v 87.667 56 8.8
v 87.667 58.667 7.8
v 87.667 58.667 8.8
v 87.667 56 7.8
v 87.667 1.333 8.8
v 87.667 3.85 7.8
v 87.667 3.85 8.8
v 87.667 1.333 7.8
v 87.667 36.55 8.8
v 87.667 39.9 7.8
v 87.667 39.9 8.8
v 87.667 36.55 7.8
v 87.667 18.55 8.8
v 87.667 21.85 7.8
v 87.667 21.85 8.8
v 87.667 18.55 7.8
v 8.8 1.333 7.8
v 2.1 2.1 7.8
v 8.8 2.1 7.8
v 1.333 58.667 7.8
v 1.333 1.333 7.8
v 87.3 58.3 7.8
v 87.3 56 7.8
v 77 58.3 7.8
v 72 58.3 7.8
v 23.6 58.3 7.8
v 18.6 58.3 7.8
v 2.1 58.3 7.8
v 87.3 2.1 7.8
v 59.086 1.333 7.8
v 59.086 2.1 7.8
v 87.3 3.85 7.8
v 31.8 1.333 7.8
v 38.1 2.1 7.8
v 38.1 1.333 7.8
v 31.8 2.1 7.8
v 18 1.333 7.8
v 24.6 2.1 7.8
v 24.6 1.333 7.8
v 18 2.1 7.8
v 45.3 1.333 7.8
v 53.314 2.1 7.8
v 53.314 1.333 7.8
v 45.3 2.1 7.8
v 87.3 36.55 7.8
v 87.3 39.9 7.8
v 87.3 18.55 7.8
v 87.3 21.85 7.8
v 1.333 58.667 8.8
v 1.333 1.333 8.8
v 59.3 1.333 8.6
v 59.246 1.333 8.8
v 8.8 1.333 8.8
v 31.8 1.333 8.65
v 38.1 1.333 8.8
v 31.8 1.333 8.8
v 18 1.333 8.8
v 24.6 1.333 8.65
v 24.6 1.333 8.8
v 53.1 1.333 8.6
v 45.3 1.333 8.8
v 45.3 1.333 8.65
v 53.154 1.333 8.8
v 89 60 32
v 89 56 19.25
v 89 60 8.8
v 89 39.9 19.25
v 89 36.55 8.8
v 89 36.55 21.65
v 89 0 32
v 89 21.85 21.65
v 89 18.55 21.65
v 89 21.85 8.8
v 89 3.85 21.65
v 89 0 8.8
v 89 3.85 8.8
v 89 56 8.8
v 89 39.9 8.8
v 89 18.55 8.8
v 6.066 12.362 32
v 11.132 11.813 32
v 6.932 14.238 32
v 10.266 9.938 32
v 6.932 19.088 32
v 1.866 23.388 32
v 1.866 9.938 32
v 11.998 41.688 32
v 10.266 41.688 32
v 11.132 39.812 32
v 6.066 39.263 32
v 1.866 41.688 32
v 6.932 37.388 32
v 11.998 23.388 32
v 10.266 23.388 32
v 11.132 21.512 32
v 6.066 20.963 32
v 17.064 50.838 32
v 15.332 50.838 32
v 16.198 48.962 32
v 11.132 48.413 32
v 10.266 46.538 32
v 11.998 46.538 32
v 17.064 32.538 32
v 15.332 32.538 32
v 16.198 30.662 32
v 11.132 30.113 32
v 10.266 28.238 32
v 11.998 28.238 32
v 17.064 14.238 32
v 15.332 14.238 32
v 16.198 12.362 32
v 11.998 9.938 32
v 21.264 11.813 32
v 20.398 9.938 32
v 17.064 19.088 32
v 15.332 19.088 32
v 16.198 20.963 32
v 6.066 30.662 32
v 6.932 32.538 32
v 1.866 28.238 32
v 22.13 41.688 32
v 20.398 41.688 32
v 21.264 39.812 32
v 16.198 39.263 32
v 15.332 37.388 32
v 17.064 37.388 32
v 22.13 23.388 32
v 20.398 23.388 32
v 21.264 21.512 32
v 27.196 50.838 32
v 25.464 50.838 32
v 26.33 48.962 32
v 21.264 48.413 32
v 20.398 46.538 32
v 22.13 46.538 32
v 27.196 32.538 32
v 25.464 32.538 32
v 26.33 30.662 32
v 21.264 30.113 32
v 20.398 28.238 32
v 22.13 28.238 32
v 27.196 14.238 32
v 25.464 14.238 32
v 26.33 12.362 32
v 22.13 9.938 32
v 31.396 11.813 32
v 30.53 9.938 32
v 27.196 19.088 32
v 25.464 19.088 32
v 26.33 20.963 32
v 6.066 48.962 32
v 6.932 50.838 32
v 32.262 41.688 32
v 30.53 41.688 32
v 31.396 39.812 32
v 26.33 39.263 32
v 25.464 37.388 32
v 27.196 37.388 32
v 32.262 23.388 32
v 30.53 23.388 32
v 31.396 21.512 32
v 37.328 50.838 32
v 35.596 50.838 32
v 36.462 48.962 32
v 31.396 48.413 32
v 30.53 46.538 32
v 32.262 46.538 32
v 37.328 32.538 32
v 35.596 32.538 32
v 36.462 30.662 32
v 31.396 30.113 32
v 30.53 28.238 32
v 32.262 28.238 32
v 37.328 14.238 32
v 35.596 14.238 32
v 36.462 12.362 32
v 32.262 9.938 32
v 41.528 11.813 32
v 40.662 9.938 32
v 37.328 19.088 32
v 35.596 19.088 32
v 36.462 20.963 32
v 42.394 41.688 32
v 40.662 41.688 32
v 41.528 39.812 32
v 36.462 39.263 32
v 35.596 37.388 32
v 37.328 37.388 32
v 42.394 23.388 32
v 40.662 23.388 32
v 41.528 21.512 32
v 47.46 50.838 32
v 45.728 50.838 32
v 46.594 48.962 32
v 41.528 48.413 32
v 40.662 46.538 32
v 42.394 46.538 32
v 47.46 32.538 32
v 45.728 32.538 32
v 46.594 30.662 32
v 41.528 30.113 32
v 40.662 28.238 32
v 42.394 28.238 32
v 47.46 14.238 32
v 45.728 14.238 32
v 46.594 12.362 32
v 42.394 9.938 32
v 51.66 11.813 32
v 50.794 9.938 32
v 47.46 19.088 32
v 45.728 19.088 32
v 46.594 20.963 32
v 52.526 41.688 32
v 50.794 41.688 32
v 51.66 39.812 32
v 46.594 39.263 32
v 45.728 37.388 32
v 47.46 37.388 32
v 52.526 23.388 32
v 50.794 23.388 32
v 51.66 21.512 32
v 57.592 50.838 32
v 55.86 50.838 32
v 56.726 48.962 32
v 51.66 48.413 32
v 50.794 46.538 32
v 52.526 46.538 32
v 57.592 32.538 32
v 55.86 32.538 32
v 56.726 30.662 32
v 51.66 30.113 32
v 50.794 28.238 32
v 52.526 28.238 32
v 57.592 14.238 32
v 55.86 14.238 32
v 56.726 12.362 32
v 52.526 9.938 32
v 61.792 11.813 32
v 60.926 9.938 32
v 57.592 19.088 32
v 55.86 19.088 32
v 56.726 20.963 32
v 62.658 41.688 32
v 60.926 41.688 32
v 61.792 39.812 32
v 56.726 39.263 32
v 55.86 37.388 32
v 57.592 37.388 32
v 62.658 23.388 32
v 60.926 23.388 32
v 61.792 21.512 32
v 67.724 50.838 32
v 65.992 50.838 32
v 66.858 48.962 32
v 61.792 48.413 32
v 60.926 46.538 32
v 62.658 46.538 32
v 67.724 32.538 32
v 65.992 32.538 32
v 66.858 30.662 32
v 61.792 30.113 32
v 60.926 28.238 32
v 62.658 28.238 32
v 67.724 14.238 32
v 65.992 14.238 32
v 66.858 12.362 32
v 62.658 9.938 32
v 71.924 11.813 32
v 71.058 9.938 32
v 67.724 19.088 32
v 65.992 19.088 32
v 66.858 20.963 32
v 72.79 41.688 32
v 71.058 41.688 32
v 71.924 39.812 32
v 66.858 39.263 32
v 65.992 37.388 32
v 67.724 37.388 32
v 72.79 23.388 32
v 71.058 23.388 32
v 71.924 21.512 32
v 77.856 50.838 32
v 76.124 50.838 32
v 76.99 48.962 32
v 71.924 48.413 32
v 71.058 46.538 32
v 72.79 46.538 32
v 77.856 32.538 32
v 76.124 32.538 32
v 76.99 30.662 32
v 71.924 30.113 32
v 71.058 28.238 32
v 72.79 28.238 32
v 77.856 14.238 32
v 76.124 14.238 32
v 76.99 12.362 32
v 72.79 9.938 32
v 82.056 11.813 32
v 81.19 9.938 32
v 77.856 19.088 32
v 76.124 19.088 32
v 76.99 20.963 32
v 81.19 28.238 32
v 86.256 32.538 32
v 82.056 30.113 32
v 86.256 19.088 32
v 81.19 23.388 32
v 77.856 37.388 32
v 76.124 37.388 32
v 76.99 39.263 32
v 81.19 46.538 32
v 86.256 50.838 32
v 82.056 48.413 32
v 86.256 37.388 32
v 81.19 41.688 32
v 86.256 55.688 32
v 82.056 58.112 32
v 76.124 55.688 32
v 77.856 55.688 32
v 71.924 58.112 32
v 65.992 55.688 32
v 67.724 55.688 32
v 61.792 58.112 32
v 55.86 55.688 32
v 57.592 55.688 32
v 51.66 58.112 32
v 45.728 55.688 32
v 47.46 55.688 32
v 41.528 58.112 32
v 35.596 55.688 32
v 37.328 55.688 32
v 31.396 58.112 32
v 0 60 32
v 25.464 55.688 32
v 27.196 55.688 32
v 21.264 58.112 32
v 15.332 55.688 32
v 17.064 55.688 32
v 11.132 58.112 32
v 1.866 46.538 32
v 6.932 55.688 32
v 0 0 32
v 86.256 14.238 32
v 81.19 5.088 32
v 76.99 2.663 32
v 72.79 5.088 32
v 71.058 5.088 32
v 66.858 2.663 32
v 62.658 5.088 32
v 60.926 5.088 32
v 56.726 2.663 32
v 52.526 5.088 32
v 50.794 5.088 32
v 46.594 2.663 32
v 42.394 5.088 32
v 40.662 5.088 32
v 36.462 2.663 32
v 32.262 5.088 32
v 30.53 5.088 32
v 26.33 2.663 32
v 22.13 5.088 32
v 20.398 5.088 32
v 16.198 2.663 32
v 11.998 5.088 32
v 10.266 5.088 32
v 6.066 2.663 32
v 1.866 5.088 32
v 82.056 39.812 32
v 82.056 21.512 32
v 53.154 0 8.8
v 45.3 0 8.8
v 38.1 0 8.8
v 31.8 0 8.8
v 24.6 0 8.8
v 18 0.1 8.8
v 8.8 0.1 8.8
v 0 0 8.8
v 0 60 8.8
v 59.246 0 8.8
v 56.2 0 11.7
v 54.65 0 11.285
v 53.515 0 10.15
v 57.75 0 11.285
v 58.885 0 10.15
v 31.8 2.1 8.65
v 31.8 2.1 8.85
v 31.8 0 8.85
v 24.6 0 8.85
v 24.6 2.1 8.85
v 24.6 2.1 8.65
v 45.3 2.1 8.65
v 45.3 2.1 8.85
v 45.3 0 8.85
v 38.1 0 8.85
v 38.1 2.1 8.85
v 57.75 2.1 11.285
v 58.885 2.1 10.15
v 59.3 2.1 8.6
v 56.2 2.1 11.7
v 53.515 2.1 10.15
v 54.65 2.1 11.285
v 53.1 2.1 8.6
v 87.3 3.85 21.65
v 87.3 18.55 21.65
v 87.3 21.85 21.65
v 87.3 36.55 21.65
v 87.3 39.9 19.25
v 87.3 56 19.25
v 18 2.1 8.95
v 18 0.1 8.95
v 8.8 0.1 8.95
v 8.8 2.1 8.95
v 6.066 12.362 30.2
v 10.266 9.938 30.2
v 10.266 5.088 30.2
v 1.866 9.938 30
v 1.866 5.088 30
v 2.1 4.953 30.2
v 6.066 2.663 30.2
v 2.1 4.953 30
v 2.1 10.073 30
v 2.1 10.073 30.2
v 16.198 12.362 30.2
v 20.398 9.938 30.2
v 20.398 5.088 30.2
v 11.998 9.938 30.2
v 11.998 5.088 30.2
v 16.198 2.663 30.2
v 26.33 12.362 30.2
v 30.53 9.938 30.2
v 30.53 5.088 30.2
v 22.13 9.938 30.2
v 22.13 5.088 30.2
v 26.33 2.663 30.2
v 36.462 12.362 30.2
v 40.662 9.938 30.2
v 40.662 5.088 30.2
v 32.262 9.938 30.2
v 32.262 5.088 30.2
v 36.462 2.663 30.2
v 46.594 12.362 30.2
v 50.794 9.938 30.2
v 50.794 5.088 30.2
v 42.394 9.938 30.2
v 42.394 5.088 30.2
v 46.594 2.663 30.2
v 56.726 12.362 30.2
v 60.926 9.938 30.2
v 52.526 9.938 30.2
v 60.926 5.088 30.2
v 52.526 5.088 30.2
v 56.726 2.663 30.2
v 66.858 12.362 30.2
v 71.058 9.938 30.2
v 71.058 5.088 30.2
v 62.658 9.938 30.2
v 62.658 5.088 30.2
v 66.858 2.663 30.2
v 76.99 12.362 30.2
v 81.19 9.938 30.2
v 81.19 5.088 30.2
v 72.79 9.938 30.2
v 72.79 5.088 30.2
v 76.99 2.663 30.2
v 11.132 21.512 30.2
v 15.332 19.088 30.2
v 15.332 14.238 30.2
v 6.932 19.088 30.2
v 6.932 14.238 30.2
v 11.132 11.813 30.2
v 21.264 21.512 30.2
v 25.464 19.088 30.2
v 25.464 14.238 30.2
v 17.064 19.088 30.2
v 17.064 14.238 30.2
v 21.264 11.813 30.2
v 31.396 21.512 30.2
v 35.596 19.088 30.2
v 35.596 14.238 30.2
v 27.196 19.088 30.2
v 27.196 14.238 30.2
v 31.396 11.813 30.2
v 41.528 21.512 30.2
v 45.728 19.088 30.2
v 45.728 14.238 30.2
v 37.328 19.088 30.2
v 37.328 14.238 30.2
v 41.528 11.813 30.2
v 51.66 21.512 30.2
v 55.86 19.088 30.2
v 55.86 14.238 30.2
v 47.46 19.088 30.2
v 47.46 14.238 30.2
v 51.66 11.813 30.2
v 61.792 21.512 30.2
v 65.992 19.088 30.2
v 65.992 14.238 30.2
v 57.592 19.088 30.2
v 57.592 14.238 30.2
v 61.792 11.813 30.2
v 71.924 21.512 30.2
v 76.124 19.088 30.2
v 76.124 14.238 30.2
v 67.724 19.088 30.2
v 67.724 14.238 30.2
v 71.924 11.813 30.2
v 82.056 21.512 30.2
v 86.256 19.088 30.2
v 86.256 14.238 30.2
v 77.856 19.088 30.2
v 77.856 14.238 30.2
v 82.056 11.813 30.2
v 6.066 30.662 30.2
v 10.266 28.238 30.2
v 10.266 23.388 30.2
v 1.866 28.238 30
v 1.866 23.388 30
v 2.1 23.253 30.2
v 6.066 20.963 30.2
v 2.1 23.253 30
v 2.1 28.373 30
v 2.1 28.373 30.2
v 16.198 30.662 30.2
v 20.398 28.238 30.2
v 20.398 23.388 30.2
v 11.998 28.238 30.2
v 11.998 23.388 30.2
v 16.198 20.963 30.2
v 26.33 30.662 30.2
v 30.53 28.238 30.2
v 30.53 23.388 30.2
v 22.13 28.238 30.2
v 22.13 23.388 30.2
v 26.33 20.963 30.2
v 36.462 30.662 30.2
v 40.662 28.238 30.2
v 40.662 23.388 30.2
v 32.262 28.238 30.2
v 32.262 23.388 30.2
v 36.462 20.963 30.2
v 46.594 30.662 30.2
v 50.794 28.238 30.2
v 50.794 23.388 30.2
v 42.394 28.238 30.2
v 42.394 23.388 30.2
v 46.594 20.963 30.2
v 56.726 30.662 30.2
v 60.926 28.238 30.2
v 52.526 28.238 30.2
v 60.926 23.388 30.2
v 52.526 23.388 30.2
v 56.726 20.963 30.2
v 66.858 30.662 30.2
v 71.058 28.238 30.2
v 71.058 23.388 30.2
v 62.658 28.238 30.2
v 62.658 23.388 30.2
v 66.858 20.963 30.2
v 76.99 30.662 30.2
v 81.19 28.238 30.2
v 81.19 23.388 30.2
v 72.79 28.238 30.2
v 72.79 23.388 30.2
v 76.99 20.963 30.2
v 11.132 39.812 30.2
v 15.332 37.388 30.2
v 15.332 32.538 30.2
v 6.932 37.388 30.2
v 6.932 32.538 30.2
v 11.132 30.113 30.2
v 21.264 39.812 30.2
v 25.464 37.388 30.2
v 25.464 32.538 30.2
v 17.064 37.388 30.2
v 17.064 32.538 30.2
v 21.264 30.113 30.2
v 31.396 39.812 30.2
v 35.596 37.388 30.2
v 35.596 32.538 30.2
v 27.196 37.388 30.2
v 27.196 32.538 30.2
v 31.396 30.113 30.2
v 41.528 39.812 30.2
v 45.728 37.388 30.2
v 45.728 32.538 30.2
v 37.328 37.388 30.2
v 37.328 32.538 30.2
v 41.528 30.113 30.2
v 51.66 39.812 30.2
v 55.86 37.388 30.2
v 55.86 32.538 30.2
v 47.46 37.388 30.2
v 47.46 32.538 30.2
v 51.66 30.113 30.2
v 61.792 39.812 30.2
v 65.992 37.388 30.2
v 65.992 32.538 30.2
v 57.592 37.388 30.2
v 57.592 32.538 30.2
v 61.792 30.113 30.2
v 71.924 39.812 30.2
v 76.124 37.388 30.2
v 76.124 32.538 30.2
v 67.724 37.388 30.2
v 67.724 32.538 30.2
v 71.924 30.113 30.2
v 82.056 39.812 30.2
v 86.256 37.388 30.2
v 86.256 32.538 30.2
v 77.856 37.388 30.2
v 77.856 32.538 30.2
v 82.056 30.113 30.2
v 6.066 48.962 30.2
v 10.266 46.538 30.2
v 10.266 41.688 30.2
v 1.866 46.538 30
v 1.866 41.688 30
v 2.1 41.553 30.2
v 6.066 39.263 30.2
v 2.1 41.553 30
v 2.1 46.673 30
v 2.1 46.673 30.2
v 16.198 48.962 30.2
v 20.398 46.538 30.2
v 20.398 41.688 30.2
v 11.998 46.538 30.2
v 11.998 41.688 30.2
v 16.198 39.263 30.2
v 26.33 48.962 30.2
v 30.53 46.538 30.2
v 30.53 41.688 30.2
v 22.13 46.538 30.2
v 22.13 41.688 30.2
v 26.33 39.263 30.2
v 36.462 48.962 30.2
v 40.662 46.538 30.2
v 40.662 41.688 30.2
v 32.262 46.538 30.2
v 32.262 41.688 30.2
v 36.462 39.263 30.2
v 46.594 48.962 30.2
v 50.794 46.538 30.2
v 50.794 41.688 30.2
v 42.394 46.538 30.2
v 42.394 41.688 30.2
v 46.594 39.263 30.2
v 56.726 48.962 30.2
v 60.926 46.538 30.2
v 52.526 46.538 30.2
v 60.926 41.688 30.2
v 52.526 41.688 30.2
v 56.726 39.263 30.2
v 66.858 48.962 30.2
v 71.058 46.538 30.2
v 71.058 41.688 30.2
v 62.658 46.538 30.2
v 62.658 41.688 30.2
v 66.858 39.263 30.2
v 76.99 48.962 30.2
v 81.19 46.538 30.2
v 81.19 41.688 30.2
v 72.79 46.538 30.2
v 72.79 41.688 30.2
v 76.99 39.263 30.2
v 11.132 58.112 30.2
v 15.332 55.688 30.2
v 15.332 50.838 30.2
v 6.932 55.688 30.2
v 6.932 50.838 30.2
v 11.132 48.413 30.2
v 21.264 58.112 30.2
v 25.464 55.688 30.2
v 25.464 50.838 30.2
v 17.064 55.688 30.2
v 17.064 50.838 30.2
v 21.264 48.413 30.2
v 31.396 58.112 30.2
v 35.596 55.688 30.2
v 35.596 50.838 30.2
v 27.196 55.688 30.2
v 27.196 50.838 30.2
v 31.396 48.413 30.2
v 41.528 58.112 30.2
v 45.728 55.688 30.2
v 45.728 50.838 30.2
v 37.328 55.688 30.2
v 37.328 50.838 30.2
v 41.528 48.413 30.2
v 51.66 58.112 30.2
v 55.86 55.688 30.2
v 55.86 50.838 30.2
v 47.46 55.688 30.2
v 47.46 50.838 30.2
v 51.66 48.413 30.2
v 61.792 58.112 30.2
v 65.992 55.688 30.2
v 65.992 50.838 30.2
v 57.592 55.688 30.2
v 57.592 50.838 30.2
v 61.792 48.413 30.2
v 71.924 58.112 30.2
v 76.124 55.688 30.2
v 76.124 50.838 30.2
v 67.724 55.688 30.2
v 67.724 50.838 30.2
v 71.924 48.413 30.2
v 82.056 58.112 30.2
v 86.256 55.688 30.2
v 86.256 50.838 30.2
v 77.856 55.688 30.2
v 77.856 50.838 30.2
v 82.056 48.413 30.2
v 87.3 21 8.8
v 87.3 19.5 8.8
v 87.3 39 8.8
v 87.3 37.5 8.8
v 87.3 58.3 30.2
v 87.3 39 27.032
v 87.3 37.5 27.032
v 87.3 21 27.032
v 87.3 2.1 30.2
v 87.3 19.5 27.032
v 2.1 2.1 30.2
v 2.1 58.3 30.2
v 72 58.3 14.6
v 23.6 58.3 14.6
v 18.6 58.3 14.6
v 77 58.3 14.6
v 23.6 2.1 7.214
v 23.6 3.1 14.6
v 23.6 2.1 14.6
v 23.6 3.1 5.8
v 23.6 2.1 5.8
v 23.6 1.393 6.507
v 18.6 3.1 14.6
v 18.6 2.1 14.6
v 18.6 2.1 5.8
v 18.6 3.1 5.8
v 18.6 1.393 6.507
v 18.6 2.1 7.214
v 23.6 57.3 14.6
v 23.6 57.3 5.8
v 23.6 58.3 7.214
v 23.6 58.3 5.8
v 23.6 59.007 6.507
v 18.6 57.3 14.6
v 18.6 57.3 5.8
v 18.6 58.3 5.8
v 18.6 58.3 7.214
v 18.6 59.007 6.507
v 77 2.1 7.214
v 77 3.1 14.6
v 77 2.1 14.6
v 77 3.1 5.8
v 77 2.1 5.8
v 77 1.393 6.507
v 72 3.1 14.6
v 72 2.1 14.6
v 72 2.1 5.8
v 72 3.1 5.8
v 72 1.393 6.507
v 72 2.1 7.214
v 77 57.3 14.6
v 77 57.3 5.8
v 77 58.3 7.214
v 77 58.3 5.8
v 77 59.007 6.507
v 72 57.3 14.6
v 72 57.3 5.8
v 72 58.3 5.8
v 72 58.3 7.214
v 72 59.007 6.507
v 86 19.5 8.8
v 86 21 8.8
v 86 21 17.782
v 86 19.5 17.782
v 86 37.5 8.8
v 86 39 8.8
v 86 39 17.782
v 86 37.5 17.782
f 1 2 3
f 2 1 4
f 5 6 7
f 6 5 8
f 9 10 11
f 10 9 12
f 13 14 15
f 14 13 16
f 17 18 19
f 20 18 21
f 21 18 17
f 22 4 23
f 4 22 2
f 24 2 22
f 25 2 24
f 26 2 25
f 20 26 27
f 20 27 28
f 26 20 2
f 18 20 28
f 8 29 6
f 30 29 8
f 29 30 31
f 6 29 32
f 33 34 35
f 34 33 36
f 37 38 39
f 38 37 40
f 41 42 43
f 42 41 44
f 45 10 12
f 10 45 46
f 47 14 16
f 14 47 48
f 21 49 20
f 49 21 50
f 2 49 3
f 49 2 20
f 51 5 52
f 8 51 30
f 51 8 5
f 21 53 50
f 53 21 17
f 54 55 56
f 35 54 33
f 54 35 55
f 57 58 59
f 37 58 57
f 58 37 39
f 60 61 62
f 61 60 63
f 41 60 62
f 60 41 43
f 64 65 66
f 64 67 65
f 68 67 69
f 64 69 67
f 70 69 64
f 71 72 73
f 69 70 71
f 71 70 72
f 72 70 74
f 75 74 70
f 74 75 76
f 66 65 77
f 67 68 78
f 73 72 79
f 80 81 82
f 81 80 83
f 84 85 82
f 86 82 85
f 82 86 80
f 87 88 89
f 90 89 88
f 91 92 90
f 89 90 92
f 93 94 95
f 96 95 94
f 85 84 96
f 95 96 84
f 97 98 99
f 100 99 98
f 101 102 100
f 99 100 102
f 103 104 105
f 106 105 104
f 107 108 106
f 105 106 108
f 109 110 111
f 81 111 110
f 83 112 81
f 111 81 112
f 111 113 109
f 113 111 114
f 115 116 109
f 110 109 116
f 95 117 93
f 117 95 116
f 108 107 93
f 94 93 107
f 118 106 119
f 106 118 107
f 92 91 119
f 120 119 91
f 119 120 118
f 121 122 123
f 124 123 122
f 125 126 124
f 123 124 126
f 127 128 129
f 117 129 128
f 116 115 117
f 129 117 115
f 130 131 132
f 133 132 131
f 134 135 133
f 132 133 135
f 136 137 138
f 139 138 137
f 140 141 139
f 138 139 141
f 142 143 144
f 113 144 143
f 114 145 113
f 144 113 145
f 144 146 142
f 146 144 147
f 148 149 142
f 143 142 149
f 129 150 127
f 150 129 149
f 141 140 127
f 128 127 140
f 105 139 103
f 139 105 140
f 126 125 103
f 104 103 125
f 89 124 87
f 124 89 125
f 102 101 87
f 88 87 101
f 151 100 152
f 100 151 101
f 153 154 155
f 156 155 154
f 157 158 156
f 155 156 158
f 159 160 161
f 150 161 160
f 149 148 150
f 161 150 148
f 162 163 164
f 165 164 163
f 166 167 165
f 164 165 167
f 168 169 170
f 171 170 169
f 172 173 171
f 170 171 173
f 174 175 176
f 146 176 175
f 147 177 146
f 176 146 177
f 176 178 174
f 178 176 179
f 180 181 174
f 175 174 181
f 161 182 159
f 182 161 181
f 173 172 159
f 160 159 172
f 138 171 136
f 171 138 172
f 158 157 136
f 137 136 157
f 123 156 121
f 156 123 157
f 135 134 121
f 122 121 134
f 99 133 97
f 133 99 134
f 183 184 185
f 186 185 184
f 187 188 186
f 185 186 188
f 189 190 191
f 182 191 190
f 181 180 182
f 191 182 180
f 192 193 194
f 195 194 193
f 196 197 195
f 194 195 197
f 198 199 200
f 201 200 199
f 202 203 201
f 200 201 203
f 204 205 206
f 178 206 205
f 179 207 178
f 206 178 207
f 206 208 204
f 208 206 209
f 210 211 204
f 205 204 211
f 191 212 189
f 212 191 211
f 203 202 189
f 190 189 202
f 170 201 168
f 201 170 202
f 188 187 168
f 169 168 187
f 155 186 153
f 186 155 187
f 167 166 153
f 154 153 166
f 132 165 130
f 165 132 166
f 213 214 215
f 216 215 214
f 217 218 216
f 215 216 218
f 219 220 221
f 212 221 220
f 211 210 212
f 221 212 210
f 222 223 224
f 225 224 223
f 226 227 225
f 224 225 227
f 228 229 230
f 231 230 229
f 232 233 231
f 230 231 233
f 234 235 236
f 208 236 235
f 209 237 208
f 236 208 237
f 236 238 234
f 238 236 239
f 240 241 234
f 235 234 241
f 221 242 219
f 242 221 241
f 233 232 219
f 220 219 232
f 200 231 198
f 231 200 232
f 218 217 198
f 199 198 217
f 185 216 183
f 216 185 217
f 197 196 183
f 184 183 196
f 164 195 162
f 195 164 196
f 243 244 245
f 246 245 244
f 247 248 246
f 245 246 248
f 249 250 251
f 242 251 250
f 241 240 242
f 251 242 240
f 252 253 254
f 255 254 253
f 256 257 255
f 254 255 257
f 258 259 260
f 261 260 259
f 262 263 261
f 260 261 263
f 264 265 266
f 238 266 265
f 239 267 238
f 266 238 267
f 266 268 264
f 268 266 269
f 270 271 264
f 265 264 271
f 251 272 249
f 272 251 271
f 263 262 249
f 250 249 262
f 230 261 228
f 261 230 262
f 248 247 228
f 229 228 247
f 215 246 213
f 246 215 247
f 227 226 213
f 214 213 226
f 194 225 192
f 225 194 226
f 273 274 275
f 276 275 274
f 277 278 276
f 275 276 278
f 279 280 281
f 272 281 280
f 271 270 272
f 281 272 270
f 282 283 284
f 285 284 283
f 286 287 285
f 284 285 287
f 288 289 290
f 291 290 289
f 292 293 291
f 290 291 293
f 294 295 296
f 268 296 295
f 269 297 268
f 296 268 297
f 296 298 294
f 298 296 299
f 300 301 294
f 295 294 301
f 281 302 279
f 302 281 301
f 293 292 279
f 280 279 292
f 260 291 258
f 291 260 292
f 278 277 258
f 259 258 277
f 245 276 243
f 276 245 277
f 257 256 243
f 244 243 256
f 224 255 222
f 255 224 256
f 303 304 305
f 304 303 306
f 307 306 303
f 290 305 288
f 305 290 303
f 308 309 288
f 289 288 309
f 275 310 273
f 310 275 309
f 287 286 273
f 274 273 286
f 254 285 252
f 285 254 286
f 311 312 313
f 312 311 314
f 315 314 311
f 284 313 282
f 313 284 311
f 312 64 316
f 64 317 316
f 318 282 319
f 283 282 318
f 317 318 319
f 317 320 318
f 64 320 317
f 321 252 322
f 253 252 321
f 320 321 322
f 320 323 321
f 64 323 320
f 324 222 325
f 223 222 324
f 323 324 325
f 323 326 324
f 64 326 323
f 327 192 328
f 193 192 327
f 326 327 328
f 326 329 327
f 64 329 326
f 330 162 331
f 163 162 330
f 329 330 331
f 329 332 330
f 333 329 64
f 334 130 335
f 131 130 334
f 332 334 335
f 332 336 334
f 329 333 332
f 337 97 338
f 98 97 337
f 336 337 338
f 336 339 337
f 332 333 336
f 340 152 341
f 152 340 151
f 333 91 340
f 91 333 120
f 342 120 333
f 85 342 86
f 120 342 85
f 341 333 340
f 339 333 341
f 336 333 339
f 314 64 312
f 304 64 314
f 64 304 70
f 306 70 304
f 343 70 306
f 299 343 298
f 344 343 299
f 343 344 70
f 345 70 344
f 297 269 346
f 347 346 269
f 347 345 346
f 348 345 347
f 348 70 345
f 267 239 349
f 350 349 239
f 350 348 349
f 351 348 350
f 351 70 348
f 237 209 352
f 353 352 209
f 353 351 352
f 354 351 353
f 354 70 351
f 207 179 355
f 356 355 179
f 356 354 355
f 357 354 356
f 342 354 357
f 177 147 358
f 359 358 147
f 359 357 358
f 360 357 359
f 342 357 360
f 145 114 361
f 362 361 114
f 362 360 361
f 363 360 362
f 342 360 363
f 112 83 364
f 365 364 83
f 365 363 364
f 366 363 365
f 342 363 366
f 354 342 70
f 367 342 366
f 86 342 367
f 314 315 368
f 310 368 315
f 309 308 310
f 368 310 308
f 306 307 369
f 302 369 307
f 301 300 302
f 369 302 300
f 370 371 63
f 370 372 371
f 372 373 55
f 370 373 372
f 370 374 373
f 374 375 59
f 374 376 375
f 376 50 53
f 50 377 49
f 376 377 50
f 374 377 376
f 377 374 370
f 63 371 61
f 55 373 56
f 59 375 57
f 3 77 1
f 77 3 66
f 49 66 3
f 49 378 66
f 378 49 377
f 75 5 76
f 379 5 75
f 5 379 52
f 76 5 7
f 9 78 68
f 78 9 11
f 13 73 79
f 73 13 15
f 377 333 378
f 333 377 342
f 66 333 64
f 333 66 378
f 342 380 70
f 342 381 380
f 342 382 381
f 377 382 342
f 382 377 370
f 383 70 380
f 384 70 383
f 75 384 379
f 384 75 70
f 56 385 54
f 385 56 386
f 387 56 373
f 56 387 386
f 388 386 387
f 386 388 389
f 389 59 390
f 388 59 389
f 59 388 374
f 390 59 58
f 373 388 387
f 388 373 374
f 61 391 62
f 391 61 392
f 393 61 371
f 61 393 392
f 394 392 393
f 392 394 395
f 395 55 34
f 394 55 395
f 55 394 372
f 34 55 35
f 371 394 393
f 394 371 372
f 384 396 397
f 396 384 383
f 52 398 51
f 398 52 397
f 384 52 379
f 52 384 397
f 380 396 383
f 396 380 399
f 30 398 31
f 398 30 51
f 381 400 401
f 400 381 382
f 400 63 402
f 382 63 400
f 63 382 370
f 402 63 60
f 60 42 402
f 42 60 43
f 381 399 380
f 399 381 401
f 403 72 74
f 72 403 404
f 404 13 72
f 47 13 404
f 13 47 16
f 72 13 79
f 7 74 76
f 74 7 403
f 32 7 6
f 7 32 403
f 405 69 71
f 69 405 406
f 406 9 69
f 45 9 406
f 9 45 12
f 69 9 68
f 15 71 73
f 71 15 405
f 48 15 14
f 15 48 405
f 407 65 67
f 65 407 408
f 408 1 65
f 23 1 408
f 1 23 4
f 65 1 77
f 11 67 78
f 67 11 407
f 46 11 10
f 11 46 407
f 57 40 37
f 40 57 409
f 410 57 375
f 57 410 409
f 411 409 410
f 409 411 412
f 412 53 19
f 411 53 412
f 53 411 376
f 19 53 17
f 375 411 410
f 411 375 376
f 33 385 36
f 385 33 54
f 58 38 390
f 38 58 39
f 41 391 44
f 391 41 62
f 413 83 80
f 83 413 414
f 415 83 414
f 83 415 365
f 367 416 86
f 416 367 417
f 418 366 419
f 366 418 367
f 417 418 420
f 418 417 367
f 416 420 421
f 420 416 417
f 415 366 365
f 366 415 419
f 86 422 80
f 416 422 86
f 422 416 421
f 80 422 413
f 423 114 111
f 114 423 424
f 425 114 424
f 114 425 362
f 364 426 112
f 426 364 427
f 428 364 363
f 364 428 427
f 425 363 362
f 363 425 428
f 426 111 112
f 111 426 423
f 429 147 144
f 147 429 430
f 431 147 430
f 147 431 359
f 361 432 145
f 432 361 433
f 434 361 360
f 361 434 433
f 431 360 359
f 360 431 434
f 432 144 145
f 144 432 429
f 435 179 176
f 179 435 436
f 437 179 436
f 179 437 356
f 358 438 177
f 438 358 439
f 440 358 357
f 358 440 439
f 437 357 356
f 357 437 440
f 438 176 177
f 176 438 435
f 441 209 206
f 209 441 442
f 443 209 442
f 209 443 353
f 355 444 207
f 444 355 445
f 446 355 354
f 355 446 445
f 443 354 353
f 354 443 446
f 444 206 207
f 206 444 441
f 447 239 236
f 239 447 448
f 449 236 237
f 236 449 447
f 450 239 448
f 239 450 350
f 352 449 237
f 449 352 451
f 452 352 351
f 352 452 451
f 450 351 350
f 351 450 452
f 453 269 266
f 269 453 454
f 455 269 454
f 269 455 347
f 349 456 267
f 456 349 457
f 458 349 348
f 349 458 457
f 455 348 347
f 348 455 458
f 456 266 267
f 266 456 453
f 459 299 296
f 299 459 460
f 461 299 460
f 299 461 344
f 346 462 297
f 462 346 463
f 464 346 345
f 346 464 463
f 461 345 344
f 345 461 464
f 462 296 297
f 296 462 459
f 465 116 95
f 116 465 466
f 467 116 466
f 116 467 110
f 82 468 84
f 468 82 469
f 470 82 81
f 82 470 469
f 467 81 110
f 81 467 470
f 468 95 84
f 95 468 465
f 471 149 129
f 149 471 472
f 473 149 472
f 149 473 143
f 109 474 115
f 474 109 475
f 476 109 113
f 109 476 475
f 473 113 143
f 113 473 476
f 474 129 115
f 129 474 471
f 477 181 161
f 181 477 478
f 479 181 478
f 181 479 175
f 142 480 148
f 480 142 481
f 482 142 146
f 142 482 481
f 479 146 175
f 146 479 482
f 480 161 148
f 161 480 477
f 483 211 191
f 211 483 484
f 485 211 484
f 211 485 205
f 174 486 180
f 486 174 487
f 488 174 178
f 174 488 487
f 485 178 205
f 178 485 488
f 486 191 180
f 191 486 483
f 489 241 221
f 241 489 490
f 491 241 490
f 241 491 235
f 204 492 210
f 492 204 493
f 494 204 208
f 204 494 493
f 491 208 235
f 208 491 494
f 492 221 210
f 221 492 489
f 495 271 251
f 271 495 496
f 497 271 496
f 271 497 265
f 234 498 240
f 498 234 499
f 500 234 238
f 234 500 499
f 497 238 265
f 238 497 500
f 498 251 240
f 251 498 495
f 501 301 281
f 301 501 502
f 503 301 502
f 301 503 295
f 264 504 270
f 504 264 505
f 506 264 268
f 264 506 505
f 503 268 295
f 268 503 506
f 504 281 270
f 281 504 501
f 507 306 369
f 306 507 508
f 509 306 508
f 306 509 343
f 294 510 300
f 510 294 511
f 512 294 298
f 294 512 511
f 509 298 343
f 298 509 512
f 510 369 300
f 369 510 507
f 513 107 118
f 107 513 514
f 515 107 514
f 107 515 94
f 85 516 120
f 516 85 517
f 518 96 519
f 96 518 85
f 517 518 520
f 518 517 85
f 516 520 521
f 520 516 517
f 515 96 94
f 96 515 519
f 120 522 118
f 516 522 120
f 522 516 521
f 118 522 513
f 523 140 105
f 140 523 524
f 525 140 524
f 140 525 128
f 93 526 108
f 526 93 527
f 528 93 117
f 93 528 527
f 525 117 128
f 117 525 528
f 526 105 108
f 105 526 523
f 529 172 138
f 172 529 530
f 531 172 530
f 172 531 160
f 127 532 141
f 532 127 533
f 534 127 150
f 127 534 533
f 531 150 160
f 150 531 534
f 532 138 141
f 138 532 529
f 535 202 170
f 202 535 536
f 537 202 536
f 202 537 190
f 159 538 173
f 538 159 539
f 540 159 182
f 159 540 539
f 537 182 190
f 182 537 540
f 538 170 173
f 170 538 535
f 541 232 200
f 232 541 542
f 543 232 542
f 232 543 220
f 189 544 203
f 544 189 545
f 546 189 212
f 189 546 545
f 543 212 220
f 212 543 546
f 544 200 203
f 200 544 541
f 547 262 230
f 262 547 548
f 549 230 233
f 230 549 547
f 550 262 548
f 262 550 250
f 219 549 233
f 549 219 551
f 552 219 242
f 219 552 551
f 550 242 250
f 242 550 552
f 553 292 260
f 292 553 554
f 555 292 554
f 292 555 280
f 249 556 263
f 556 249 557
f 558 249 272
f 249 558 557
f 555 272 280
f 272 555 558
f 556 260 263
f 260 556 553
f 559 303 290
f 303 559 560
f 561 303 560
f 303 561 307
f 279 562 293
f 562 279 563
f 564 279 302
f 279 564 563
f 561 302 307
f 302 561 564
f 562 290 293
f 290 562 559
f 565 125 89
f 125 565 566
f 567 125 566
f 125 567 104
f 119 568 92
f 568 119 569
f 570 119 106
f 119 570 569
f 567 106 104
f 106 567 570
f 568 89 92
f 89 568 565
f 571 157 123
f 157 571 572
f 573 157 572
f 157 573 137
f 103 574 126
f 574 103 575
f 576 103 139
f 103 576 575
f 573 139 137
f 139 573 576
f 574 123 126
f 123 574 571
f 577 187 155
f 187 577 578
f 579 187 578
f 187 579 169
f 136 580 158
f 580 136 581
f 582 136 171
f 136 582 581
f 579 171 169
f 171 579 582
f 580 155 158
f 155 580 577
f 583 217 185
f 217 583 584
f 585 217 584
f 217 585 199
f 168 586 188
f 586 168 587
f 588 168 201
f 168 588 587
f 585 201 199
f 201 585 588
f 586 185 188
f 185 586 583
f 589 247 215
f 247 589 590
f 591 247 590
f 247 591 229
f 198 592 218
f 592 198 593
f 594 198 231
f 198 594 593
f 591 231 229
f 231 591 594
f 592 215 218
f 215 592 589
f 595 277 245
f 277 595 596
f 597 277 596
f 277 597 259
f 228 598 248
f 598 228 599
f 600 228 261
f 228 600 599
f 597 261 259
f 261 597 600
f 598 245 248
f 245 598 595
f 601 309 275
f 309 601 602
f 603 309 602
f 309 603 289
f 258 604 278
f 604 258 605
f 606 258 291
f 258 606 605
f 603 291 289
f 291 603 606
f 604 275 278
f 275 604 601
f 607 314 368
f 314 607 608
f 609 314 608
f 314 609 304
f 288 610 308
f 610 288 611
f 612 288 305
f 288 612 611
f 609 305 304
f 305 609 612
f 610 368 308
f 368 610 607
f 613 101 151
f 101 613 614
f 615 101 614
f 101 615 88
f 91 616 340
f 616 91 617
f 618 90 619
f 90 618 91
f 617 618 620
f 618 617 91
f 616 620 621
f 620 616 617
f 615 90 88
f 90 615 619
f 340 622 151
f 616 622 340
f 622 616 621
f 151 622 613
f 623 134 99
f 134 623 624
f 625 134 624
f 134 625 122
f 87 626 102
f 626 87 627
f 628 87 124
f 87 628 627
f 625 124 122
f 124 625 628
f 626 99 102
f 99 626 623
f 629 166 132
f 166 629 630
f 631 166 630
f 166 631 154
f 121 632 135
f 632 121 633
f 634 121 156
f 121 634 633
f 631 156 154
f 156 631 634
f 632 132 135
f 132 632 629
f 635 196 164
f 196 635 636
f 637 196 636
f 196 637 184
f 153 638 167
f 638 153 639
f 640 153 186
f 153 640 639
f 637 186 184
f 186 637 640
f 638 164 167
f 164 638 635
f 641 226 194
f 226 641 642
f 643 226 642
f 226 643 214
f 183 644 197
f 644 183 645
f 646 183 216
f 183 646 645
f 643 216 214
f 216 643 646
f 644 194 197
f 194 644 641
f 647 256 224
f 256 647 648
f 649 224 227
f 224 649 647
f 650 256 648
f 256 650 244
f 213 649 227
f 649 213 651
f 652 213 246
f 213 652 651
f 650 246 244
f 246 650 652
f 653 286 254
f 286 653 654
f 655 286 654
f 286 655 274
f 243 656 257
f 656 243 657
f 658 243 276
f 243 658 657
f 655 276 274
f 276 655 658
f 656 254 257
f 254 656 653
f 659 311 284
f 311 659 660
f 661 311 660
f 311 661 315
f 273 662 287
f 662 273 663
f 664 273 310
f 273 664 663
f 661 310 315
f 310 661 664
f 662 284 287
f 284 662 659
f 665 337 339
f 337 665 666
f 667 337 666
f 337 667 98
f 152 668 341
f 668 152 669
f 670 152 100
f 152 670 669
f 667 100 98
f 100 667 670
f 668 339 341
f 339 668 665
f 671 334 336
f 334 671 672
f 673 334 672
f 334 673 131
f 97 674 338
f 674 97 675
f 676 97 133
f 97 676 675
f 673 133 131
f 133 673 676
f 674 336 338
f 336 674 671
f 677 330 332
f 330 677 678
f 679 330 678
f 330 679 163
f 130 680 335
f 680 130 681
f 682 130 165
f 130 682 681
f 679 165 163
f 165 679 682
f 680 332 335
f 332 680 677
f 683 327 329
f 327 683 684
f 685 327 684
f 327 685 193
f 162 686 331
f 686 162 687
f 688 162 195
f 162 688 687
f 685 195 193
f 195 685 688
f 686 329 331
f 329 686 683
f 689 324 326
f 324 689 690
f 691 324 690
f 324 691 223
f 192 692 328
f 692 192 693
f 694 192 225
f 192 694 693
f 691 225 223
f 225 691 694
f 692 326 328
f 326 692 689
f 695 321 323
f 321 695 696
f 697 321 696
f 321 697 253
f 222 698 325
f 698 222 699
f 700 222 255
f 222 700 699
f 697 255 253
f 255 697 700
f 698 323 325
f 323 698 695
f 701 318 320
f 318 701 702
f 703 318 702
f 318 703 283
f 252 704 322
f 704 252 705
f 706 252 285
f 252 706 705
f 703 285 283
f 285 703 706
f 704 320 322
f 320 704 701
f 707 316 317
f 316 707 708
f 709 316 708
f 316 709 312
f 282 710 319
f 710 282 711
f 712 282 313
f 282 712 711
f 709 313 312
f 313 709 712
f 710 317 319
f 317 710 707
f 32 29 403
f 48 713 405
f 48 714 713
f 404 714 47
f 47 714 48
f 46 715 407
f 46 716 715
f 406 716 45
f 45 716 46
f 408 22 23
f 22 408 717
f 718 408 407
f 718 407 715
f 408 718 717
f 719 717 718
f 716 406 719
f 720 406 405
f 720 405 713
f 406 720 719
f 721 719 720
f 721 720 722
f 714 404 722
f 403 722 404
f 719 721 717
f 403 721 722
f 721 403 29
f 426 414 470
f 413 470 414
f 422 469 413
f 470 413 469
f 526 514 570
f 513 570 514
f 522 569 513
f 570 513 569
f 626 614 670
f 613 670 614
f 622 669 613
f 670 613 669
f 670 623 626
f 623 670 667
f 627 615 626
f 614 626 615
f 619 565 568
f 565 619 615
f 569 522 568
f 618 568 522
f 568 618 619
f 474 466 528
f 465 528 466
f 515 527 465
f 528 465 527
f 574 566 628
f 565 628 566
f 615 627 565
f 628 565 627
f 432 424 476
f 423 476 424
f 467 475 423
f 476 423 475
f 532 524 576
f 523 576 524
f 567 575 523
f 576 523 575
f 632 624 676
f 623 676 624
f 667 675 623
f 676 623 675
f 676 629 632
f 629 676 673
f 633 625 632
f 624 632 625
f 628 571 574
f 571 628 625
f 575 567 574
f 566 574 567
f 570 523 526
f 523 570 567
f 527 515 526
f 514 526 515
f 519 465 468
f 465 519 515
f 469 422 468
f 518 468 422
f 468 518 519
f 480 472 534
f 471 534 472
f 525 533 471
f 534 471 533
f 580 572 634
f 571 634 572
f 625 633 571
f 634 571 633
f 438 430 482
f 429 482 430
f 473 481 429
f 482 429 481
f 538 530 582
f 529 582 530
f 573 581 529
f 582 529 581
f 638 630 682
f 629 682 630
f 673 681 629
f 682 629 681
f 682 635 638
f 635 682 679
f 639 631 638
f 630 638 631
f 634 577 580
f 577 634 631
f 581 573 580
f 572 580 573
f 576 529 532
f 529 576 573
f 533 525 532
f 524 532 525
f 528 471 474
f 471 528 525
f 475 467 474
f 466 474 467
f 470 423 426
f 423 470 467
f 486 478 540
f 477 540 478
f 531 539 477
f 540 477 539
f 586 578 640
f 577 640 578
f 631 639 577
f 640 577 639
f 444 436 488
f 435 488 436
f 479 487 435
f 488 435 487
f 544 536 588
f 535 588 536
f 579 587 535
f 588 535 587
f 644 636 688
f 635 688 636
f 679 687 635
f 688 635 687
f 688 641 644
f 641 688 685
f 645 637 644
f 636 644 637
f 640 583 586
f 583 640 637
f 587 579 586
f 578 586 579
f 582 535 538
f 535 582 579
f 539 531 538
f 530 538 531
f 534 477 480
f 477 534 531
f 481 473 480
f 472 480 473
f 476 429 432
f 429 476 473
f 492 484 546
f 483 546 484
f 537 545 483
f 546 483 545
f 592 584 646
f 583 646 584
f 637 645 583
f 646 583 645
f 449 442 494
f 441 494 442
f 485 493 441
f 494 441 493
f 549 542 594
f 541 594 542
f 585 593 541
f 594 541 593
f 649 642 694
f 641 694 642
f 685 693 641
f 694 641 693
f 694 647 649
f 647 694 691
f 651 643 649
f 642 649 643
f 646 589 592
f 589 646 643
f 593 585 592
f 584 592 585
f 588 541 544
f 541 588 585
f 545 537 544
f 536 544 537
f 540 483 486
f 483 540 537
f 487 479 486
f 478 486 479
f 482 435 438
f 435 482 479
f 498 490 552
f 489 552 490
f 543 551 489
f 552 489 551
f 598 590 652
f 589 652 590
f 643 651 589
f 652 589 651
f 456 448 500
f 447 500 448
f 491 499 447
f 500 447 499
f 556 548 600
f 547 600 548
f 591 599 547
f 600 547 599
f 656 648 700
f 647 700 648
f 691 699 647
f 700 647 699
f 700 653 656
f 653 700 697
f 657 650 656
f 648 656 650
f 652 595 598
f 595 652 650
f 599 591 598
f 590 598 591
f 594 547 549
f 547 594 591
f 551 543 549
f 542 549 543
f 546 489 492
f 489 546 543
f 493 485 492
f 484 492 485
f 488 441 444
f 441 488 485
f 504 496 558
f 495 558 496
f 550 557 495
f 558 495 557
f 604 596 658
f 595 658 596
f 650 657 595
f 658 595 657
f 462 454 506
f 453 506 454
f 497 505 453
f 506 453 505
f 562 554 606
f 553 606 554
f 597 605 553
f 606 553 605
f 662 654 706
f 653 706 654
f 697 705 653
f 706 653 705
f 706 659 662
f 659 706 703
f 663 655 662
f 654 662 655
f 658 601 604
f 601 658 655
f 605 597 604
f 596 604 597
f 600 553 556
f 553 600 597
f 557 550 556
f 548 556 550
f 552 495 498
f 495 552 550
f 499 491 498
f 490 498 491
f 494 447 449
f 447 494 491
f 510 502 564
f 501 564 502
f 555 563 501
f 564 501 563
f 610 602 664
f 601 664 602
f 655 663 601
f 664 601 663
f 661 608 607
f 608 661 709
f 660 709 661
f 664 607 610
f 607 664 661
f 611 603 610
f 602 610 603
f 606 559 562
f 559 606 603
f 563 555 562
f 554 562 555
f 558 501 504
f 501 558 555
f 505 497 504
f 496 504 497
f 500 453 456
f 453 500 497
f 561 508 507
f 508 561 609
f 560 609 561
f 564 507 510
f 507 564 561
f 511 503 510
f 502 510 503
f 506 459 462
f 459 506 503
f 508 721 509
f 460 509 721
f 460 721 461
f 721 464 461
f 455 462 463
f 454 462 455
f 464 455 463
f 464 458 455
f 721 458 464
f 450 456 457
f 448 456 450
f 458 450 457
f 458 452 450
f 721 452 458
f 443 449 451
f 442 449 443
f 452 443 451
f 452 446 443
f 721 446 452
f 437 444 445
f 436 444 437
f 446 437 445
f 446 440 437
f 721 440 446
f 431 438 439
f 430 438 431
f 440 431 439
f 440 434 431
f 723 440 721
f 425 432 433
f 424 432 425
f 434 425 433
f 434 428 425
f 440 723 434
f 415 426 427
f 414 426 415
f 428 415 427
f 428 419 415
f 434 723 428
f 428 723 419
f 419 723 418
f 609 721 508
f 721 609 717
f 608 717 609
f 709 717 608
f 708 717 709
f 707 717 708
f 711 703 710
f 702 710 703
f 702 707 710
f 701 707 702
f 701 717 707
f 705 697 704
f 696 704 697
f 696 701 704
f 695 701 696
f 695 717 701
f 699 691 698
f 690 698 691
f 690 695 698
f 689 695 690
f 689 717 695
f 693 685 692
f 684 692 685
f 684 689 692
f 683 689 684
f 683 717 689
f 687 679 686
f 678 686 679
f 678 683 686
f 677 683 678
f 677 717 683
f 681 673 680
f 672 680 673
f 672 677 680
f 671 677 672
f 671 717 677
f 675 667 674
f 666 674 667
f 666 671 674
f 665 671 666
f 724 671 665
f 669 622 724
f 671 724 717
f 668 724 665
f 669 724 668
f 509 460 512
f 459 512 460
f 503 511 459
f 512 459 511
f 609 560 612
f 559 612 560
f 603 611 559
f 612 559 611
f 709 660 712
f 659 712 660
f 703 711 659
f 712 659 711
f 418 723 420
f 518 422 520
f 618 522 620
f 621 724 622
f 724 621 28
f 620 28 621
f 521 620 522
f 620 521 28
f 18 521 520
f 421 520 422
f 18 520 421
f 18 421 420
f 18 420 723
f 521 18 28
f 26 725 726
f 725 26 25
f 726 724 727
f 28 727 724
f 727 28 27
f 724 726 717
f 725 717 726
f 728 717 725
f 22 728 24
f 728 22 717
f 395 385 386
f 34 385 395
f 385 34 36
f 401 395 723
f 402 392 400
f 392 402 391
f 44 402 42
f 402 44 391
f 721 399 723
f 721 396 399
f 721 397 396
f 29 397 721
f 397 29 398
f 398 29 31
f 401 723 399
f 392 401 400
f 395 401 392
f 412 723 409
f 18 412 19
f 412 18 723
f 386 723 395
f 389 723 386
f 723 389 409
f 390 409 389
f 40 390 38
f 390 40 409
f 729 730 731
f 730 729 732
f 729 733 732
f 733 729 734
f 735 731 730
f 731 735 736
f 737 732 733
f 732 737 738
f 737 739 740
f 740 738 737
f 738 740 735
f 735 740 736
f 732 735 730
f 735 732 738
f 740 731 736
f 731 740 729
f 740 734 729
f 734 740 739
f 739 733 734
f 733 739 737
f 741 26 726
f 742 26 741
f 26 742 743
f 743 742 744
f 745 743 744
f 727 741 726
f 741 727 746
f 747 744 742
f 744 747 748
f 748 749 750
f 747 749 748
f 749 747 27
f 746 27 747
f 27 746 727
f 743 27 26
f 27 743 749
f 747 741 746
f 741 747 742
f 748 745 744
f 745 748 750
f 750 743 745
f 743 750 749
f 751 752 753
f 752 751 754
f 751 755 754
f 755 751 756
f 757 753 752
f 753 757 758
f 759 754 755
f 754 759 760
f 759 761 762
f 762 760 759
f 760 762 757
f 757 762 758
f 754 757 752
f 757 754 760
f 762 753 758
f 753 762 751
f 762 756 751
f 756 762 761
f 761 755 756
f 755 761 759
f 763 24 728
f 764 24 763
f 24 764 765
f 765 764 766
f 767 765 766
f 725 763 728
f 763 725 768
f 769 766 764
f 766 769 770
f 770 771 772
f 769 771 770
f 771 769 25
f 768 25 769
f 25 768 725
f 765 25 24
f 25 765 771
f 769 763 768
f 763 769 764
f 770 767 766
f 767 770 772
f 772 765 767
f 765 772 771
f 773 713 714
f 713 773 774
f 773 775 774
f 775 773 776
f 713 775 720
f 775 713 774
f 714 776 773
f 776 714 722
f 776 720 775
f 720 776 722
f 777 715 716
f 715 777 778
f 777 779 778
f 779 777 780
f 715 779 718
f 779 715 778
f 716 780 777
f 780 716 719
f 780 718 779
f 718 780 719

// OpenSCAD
// file: bases/pis.scad
// All dimensions in mm!

pi4_length = 85;
pi4_width = 56;

// Rough model for the pi4 for cases
module pi4(tol=0) {
  pcb_with_holes(tol=tol);
  headers(tol=tol);
  translate([80, 9, 0])
    usb_stack(tol=tol);
  translate([80, 27, 0])
    usb_stack(tol=tol);
  translate([78, 45.75, 0])
    ethernet_jack(tol=tol);
  translate([3.5+7.7, 2, 0])
    usb_c(tol=tol);
  // pi4 cpu
  color("grey")
    translate([25.75+3.5, 32.5, 2.8])
    cube([12, 12, 2.4], center=true);
  translate([3.5+7.7+14.8, 1.75, 0])
    micro_hdmi(tol=tol);
  translate([3.5+7.7+14.8+13.5, 1.75, 0])
    micro_hdmi(tol=tol);
  translate([3.5+7.7+14.8+13.5+7+7.5, 6.25, 0])
    trrs(tol=tol);
  translate([1.5, 22, 0])
    microsd(tol=tol);
}

module pcb_with_holes(tol=0) {
  color("green") {
    translate([-tol, -tol, 0])
    difference() {
      cube([pi4_length+2*tol, pi4_width+2*tol, 1.6]);
      translate([0, 0, -0.2]) {
        translate([3.5, 3.5, 0])
          cylinder(r=1.25, h=2, $fn=16);
        translate([3.5, 49+3.5, 0])
          cylinder(r=1.25, h=2, $fn=16);
        translate([58+3.5, 3.5, 0])
          cylinder(r=1.25, h=2, $fn=16);
        translate([58+3.5, 49+3.5, 0])
          cylinder(r=1.25, h=2, $fn=16);
      }
    }
  }
}

module headers(tol=0) {
  color("black")
    translate([3.5+29-52/2-tol, 50-tol, 1.6])
    cube([52+2*tol, 5+2*tol, 8.5+tol]);
}

module usb_stack(tol=0) {
  color("blue") {
    translate([0, 0, 9.6])
      cube([17.5+2*tol, 14.5+2*tol, 16+tol], center=true);
  }
}

module ethernet_jack(tol=0) {
  color("grey") {
    translate([0, 0, 13.6/2+1.6])
      cube([21.2+2*tol, 15.9+2*tol, 13.6+tol], center=true);
  }
}

module usb_c(tol=0) {
  color("red") {
    translate([0, 0, 3.3/2+1.6])
      cube([9+2*tol, 8+2*tol, 3.3+tol], center=true);
  }
}

module micro_hdmi(tol=0) {
  color("orange") {
    translate([0, 0, 3/2+1.6])
      cube([7+2*tol, 7.5+2*tol, 3+tol], center=true);
  }
}

module trrs(tol=0) {
  color("purple") {
    translate([0, 0, 3+1.6]) {
      cube([7+2*tol, 12.5+2*tol, 6+tol], center=true);
      translate([0, -7.5, 0])
        rotate([90, 0, 0])
        cylinder(d=6+2*tol, h=2.5, center=true, $fn=12);
    }
  }
}

module microsd(tol=0) {
  color("white") {
    // bottom of pcb
    translate([-tol, -tol, -(1.8+tol)]) {
      cube([11.4+2*tol, 12+2*tol, 1.8+tol]);
    }
  }
}
// main file
include <bases/pis.scad>

RENDER_MODE = 2;

wall_thick = 2;
base_thick = wall_thick;
bottom_clearance = 2;
case_open_height = 28;
case_height = case_open_height+wall_thick+base_thick;
bottom_height = base_thick + 1.6 + 3.2 + bottom_clearance;
lip_height = 1;
lip_depth = wall_thick/3;
// tolerance on edges
tol = 0.1;
// clip positions
clips = [3.5+7.7+14.8/2, 72];
clip_width = 5;
clip_height = base_thick + 3.8;
clip_depth = 1;

module hexagon(r){
    polygon(points=[
                [r,(r*(tan(30)))],
                [0,(r*(2/sqrt(3)))],
                [-r,(r*(tan(30)))],
                [-r,-(r*(tan(30)))],
                [0,-(r*(2/sqrt(3)))],
                [r,-(r*(tan(30)))]
    ]);
}

module hexagon_tiles(hex_r, hex_sep, length, width, height) {
	tile_spacing = 2*hex_r + 2*hex_sep*2/sqrt(3);
	tile_row_spacing = 2*hex_r + hex_sep;
	num_cols = floor(length/tile_spacing);
	num_rows = floor(width/tile_row_spacing);
	translate([0, -(hex_r*sqrt(3)/2), 0])
	for (i = [1:num_rows]) {
    row_offset = (tile_spacing / 2) * (i % 2);
	  translate([row_offset, i*tile_row_spacing, 0]) {
      for (k = [1-(i%2):num_cols-(i%2)]) {
        translate([k*tile_spacing, 0, 0]) {
          linear_extrude(height=height) {
            hexagon(hex_r);
          }
        }
      }
	  }
	}
}

module pi_hex_tiles() {
  hexagon_tiles(4.2, 0.75, pi4_length, pi4_width, wall_thick*2);
}

module pi4_inplace() {
  translate([wall_thick+2*tol, wall_thick+2*tol, base_thick+bottom_clearance])
    pi4(tol=tol);
}

module innerhollow() {
  translate([wall_thick+tol, wall_thick+tol, base_thick])
    cube([pi4_length+2*tol, pi4_width+2*tol, case_open_height+2*tol]);
}

module picase_lip() {
  translate([wall_thick-lip_depth, wall_thick-lip_depth, bottom_height-lip_height])
  difference() {
    cube([pi4_length+2*lip_depth, pi4_width+2*lip_depth, lip_height]);
    translate([lip_depth+tol, lip_depth+tol, 0])
      cube([pi4_length, pi4_width, lip_height]);
  }
}

// Expand the hdmi ports vertically just a touch
module port_fix() {
  translate([wall_thick+3.5+7.7+14.8+2*tol, 1.75+wall_thick+tol, base_thick+0.2+bottom_clearance]) {
    micro_hdmi(tol=tol);
    translate([13.5, 0, 0])
      micro_hdmi(tol=tol);
  }
}

// Feet under pi
module pi_feet() {
  module single_foot() {
    cylinder(d=4, h=bottom_clearance, $fn=20);
    translate([0, 0, bottom_clearance])
      cylinder(d=2, h=2, $fn=20);
  }
  translate([wall_thick+tol, wall_thick+tol, base_thick]) {
    translate([3.5, 3.5, 0])
      single_foot();
    translate([3.5, 3.5+49, 0])
      single_foot();
    translate([3.5+58, 3.5, 0])
      single_foot();
    translate([3.5+58, 3.5+49, 0])
      single_foot();
  }
}

module sd_slot() {
  translate([-4, 22+wall_thick, base_thick])
    union() {
      cube([12+2*tol, 12+2*tol, bottom_clearance+tol]);
      // Extra depth to grab end of sd
      translate([0, 0, -base_thick-tol])
        cube([7+wall_thick*2, 12+2*tol, base_thick+tol]);
    }
}

module clip_female() {
  #union() {
    for(i=[0:1]) {
      translate([clips[i], wall_thick-clip_depth+tol, clip_height])
        cube([clip_width, clip_depth, clip_depth]);
      translate([clips[i], wall_thick+pi4_width+2*tol, clip_height])
        cube([clip_width, clip_depth, clip_depth]);
    }
  }
}

module clip_male() {
  union() {
    for(i=[0:1]) {
      translate([clips[i], wall_thick-clip_depth+tol, clip_height]) {
        translate([0, clip_depth, 0])
          cube([clip_width, clip_depth, bottom_height]);
        translate([0, clip_depth, 0])
          rotate([45, 0, 0])
          cube([clip_width, clip_depth, clip_depth]);
      }
      translate([clips[i], wall_thick+pi4_width+3*tol, clip_height]) {
        translate([0, -clip_depth, 0])
          cube([clip_width, clip_depth, bottom_height]);
        rotate([45, 0, 0])
          cube([clip_width, clip_depth, clip_depth]);
      }
    }
  }
}

// Reinforcing ribs
module top_ribs() {
  #translate([wall_thick, wall_thick, bottom_height]) {
    // Between USB ports
    translate([pi4_length-1, 17.5, 0])
      difference() {
        cube([2, 1.5, case_height-bottom_height-2*wall_thick]);
        rotate([0, 8, 0])
          translate([-3.25, 0, 0])
          cube([2, 1.5, case_height-bottom_height-2*wall_thick]);
      }
    // Between USB and ethernet
    translate([pi4_length-1, 35.5, 0])
      difference() {
        cube([2, 1.5, case_height-bottom_height-2*wall_thick]);
        rotate([0, 8, 0])
          translate([-3.25, 0, 0])
          cube([2, 1.5, case_height-bottom_height-2*wall_thick]);
      }
  }
}

module picase_bottom() {
    color("green", 0.25)
      union() {
        difference() {
          cube([pi4_length+2*wall_thick, pi4_width+2*wall_thick, bottom_height]);
          innerhollow();
          port_fix();
          pi4_inplace();
          picase_lip();
          sd_slot();
          clip_female();
        }
        pi_feet();
      }
}

module picase_top() {
    color("blue", 0.5)
      union() {
        difference() {
          union() {
            translate([0, 0, bottom_height])
              cube([
                  pi4_length+2*wall_thick,
                  pi4_width+2*wall_thick,
                  case_height-bottom_height]);
            picase_lip();
          }
          innerhollow();
          port_fix();
          pi4_inplace();
          translate([wall_thick/2, wall_thick, case_height-wall_thick])
            pi_hex_tiles();
        }
        clip_male();
        top_ribs();
      }
}

module picase() {
  if (RENDER_MODE == 0) {
    picase_top();
    picase_bottom();
    %pi4_inplace();
  } else if (RENDER_MODE == 1) {
    picase_bottom();
  } else if (RENDER_MODE == 2) {
    picase_top();
  }
}

picase();
//pi4();
